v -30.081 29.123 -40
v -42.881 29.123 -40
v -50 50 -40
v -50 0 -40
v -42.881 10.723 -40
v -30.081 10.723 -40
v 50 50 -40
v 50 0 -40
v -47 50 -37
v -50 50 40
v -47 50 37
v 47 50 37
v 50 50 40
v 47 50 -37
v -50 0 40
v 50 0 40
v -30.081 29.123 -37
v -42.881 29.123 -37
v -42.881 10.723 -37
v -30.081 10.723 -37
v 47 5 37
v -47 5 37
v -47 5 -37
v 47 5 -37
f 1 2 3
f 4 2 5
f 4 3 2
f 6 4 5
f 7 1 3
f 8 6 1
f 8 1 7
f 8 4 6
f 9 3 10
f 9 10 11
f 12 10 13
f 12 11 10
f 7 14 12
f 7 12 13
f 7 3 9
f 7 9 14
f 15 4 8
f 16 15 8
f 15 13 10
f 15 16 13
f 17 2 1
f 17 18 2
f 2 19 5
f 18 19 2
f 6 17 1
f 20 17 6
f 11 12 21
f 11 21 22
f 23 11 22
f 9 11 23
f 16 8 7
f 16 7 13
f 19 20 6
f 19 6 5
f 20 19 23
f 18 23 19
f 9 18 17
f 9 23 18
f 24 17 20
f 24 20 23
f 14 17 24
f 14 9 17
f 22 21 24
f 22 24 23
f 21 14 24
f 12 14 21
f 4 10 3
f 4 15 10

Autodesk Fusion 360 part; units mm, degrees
sketch "Sketch1" plane through (0, 0, 0) normal (0, 1, 0) x (1, 0, 0)
  line L0 (50, -40) -> (-50, -40)
  line L1 (-50, -40) -> (-50, 40)
  line L2 (-50, 40) -> (50, 40)
  line L3 (50, 40) -> (50, -40)
  line L4 (50, -40) -> (-50, 40) construction
  line L5 (-50, -40) -> (50, 40) construction
  dimension "d1" = 100
  dimension "d2" = 80
extrude "Extrude1" add sketch "Sketch1" along normal blind 50
sketch "Sketch2" plane through (0, 50, 0) normal (0, 1, 0) x (-1, 0, 0)
  line L0 (-50, -40) -> (50, -40)
  line L1 (50, -40) -> (50, 40)
  line L2 (50, 40) -> (-50, 40)
  line L3 (-50, 40) -> (-50, -40)
  line L4 (-47, 37) -> (47, 37)
  line L5 (47, 37) -> (47, -37)
  line L6 (47, -37) -> (-47, -37)
  line L7 (-47, -37) -> (-47, 37)
  line L8 (-47, 37) -> (47, -37) construction
  line L9 (47, 37) -> (-47, -37) construction
  dimension "d5" = 94
  dimension "d6" = 74
  dimension "d15" = 3
  dimension "d16" = 3
extrude "Extrude4" cut sketch "Sketch2" against normal blind 45 contours L4 L5 L6 L7
sketch "Sketch5" plane through (0, 0, -37) normal (0, 0, 1) x (1, 0, 0)
  line L0 (47, 50) -> (-47, 50)
  line L1 (-47, 50) -> (-47, 5)
  line L2 (-47, 5) -> (47, 5)
  line L3 (47, 5) -> (47, 50)
  line L4 (-42.8809, 29.1227) -> (-30.0809, 29.1227)
  line L5 (-30.0809, 29.1227) -> (-30.0809, 10.7227)
  line L6 (-30.0809, 10.7227) -> (-42.8809, 10.7227)
  line L7 (-42.8809, 10.7227) -> (-42.8809, 29.1227)
  dimension "d19" = 12.8
  dimension "d20" = 18.4
extrude "Extrude5" cut sketch "Sketch5" against normal blind 55 contours L4 L5 L6 L7
extrude "Extrude2" [rolled back] along distance -45 taper angle 0
sketch "Sketch3" plane through (0, 0, -40) normal (0, 0, -1) x (-1, 0, 0)
  line L0 (-50, 0) -> (50, 0)
  line L1 (50, 0) -> (50, 50)
  line L2 (50, 50) -> (-50, 50)
  line L3 (-50, 50) -> (-50, 0)
  line L4 (-45, 5) -> (-32.2, 5)
  line L5 (-32.2, 5) -> (-32.2, 23.4)
  line L6 (-32.2, 23.4) -> (-45, 23.4)
  line L7 (-45, 23.4) -> (-45, 5)
  dimension "d11" = 12.8
  dimension "d12" = 18.4
extrude "Extrude3" [rolled back] along distance -10 taper angle 0
